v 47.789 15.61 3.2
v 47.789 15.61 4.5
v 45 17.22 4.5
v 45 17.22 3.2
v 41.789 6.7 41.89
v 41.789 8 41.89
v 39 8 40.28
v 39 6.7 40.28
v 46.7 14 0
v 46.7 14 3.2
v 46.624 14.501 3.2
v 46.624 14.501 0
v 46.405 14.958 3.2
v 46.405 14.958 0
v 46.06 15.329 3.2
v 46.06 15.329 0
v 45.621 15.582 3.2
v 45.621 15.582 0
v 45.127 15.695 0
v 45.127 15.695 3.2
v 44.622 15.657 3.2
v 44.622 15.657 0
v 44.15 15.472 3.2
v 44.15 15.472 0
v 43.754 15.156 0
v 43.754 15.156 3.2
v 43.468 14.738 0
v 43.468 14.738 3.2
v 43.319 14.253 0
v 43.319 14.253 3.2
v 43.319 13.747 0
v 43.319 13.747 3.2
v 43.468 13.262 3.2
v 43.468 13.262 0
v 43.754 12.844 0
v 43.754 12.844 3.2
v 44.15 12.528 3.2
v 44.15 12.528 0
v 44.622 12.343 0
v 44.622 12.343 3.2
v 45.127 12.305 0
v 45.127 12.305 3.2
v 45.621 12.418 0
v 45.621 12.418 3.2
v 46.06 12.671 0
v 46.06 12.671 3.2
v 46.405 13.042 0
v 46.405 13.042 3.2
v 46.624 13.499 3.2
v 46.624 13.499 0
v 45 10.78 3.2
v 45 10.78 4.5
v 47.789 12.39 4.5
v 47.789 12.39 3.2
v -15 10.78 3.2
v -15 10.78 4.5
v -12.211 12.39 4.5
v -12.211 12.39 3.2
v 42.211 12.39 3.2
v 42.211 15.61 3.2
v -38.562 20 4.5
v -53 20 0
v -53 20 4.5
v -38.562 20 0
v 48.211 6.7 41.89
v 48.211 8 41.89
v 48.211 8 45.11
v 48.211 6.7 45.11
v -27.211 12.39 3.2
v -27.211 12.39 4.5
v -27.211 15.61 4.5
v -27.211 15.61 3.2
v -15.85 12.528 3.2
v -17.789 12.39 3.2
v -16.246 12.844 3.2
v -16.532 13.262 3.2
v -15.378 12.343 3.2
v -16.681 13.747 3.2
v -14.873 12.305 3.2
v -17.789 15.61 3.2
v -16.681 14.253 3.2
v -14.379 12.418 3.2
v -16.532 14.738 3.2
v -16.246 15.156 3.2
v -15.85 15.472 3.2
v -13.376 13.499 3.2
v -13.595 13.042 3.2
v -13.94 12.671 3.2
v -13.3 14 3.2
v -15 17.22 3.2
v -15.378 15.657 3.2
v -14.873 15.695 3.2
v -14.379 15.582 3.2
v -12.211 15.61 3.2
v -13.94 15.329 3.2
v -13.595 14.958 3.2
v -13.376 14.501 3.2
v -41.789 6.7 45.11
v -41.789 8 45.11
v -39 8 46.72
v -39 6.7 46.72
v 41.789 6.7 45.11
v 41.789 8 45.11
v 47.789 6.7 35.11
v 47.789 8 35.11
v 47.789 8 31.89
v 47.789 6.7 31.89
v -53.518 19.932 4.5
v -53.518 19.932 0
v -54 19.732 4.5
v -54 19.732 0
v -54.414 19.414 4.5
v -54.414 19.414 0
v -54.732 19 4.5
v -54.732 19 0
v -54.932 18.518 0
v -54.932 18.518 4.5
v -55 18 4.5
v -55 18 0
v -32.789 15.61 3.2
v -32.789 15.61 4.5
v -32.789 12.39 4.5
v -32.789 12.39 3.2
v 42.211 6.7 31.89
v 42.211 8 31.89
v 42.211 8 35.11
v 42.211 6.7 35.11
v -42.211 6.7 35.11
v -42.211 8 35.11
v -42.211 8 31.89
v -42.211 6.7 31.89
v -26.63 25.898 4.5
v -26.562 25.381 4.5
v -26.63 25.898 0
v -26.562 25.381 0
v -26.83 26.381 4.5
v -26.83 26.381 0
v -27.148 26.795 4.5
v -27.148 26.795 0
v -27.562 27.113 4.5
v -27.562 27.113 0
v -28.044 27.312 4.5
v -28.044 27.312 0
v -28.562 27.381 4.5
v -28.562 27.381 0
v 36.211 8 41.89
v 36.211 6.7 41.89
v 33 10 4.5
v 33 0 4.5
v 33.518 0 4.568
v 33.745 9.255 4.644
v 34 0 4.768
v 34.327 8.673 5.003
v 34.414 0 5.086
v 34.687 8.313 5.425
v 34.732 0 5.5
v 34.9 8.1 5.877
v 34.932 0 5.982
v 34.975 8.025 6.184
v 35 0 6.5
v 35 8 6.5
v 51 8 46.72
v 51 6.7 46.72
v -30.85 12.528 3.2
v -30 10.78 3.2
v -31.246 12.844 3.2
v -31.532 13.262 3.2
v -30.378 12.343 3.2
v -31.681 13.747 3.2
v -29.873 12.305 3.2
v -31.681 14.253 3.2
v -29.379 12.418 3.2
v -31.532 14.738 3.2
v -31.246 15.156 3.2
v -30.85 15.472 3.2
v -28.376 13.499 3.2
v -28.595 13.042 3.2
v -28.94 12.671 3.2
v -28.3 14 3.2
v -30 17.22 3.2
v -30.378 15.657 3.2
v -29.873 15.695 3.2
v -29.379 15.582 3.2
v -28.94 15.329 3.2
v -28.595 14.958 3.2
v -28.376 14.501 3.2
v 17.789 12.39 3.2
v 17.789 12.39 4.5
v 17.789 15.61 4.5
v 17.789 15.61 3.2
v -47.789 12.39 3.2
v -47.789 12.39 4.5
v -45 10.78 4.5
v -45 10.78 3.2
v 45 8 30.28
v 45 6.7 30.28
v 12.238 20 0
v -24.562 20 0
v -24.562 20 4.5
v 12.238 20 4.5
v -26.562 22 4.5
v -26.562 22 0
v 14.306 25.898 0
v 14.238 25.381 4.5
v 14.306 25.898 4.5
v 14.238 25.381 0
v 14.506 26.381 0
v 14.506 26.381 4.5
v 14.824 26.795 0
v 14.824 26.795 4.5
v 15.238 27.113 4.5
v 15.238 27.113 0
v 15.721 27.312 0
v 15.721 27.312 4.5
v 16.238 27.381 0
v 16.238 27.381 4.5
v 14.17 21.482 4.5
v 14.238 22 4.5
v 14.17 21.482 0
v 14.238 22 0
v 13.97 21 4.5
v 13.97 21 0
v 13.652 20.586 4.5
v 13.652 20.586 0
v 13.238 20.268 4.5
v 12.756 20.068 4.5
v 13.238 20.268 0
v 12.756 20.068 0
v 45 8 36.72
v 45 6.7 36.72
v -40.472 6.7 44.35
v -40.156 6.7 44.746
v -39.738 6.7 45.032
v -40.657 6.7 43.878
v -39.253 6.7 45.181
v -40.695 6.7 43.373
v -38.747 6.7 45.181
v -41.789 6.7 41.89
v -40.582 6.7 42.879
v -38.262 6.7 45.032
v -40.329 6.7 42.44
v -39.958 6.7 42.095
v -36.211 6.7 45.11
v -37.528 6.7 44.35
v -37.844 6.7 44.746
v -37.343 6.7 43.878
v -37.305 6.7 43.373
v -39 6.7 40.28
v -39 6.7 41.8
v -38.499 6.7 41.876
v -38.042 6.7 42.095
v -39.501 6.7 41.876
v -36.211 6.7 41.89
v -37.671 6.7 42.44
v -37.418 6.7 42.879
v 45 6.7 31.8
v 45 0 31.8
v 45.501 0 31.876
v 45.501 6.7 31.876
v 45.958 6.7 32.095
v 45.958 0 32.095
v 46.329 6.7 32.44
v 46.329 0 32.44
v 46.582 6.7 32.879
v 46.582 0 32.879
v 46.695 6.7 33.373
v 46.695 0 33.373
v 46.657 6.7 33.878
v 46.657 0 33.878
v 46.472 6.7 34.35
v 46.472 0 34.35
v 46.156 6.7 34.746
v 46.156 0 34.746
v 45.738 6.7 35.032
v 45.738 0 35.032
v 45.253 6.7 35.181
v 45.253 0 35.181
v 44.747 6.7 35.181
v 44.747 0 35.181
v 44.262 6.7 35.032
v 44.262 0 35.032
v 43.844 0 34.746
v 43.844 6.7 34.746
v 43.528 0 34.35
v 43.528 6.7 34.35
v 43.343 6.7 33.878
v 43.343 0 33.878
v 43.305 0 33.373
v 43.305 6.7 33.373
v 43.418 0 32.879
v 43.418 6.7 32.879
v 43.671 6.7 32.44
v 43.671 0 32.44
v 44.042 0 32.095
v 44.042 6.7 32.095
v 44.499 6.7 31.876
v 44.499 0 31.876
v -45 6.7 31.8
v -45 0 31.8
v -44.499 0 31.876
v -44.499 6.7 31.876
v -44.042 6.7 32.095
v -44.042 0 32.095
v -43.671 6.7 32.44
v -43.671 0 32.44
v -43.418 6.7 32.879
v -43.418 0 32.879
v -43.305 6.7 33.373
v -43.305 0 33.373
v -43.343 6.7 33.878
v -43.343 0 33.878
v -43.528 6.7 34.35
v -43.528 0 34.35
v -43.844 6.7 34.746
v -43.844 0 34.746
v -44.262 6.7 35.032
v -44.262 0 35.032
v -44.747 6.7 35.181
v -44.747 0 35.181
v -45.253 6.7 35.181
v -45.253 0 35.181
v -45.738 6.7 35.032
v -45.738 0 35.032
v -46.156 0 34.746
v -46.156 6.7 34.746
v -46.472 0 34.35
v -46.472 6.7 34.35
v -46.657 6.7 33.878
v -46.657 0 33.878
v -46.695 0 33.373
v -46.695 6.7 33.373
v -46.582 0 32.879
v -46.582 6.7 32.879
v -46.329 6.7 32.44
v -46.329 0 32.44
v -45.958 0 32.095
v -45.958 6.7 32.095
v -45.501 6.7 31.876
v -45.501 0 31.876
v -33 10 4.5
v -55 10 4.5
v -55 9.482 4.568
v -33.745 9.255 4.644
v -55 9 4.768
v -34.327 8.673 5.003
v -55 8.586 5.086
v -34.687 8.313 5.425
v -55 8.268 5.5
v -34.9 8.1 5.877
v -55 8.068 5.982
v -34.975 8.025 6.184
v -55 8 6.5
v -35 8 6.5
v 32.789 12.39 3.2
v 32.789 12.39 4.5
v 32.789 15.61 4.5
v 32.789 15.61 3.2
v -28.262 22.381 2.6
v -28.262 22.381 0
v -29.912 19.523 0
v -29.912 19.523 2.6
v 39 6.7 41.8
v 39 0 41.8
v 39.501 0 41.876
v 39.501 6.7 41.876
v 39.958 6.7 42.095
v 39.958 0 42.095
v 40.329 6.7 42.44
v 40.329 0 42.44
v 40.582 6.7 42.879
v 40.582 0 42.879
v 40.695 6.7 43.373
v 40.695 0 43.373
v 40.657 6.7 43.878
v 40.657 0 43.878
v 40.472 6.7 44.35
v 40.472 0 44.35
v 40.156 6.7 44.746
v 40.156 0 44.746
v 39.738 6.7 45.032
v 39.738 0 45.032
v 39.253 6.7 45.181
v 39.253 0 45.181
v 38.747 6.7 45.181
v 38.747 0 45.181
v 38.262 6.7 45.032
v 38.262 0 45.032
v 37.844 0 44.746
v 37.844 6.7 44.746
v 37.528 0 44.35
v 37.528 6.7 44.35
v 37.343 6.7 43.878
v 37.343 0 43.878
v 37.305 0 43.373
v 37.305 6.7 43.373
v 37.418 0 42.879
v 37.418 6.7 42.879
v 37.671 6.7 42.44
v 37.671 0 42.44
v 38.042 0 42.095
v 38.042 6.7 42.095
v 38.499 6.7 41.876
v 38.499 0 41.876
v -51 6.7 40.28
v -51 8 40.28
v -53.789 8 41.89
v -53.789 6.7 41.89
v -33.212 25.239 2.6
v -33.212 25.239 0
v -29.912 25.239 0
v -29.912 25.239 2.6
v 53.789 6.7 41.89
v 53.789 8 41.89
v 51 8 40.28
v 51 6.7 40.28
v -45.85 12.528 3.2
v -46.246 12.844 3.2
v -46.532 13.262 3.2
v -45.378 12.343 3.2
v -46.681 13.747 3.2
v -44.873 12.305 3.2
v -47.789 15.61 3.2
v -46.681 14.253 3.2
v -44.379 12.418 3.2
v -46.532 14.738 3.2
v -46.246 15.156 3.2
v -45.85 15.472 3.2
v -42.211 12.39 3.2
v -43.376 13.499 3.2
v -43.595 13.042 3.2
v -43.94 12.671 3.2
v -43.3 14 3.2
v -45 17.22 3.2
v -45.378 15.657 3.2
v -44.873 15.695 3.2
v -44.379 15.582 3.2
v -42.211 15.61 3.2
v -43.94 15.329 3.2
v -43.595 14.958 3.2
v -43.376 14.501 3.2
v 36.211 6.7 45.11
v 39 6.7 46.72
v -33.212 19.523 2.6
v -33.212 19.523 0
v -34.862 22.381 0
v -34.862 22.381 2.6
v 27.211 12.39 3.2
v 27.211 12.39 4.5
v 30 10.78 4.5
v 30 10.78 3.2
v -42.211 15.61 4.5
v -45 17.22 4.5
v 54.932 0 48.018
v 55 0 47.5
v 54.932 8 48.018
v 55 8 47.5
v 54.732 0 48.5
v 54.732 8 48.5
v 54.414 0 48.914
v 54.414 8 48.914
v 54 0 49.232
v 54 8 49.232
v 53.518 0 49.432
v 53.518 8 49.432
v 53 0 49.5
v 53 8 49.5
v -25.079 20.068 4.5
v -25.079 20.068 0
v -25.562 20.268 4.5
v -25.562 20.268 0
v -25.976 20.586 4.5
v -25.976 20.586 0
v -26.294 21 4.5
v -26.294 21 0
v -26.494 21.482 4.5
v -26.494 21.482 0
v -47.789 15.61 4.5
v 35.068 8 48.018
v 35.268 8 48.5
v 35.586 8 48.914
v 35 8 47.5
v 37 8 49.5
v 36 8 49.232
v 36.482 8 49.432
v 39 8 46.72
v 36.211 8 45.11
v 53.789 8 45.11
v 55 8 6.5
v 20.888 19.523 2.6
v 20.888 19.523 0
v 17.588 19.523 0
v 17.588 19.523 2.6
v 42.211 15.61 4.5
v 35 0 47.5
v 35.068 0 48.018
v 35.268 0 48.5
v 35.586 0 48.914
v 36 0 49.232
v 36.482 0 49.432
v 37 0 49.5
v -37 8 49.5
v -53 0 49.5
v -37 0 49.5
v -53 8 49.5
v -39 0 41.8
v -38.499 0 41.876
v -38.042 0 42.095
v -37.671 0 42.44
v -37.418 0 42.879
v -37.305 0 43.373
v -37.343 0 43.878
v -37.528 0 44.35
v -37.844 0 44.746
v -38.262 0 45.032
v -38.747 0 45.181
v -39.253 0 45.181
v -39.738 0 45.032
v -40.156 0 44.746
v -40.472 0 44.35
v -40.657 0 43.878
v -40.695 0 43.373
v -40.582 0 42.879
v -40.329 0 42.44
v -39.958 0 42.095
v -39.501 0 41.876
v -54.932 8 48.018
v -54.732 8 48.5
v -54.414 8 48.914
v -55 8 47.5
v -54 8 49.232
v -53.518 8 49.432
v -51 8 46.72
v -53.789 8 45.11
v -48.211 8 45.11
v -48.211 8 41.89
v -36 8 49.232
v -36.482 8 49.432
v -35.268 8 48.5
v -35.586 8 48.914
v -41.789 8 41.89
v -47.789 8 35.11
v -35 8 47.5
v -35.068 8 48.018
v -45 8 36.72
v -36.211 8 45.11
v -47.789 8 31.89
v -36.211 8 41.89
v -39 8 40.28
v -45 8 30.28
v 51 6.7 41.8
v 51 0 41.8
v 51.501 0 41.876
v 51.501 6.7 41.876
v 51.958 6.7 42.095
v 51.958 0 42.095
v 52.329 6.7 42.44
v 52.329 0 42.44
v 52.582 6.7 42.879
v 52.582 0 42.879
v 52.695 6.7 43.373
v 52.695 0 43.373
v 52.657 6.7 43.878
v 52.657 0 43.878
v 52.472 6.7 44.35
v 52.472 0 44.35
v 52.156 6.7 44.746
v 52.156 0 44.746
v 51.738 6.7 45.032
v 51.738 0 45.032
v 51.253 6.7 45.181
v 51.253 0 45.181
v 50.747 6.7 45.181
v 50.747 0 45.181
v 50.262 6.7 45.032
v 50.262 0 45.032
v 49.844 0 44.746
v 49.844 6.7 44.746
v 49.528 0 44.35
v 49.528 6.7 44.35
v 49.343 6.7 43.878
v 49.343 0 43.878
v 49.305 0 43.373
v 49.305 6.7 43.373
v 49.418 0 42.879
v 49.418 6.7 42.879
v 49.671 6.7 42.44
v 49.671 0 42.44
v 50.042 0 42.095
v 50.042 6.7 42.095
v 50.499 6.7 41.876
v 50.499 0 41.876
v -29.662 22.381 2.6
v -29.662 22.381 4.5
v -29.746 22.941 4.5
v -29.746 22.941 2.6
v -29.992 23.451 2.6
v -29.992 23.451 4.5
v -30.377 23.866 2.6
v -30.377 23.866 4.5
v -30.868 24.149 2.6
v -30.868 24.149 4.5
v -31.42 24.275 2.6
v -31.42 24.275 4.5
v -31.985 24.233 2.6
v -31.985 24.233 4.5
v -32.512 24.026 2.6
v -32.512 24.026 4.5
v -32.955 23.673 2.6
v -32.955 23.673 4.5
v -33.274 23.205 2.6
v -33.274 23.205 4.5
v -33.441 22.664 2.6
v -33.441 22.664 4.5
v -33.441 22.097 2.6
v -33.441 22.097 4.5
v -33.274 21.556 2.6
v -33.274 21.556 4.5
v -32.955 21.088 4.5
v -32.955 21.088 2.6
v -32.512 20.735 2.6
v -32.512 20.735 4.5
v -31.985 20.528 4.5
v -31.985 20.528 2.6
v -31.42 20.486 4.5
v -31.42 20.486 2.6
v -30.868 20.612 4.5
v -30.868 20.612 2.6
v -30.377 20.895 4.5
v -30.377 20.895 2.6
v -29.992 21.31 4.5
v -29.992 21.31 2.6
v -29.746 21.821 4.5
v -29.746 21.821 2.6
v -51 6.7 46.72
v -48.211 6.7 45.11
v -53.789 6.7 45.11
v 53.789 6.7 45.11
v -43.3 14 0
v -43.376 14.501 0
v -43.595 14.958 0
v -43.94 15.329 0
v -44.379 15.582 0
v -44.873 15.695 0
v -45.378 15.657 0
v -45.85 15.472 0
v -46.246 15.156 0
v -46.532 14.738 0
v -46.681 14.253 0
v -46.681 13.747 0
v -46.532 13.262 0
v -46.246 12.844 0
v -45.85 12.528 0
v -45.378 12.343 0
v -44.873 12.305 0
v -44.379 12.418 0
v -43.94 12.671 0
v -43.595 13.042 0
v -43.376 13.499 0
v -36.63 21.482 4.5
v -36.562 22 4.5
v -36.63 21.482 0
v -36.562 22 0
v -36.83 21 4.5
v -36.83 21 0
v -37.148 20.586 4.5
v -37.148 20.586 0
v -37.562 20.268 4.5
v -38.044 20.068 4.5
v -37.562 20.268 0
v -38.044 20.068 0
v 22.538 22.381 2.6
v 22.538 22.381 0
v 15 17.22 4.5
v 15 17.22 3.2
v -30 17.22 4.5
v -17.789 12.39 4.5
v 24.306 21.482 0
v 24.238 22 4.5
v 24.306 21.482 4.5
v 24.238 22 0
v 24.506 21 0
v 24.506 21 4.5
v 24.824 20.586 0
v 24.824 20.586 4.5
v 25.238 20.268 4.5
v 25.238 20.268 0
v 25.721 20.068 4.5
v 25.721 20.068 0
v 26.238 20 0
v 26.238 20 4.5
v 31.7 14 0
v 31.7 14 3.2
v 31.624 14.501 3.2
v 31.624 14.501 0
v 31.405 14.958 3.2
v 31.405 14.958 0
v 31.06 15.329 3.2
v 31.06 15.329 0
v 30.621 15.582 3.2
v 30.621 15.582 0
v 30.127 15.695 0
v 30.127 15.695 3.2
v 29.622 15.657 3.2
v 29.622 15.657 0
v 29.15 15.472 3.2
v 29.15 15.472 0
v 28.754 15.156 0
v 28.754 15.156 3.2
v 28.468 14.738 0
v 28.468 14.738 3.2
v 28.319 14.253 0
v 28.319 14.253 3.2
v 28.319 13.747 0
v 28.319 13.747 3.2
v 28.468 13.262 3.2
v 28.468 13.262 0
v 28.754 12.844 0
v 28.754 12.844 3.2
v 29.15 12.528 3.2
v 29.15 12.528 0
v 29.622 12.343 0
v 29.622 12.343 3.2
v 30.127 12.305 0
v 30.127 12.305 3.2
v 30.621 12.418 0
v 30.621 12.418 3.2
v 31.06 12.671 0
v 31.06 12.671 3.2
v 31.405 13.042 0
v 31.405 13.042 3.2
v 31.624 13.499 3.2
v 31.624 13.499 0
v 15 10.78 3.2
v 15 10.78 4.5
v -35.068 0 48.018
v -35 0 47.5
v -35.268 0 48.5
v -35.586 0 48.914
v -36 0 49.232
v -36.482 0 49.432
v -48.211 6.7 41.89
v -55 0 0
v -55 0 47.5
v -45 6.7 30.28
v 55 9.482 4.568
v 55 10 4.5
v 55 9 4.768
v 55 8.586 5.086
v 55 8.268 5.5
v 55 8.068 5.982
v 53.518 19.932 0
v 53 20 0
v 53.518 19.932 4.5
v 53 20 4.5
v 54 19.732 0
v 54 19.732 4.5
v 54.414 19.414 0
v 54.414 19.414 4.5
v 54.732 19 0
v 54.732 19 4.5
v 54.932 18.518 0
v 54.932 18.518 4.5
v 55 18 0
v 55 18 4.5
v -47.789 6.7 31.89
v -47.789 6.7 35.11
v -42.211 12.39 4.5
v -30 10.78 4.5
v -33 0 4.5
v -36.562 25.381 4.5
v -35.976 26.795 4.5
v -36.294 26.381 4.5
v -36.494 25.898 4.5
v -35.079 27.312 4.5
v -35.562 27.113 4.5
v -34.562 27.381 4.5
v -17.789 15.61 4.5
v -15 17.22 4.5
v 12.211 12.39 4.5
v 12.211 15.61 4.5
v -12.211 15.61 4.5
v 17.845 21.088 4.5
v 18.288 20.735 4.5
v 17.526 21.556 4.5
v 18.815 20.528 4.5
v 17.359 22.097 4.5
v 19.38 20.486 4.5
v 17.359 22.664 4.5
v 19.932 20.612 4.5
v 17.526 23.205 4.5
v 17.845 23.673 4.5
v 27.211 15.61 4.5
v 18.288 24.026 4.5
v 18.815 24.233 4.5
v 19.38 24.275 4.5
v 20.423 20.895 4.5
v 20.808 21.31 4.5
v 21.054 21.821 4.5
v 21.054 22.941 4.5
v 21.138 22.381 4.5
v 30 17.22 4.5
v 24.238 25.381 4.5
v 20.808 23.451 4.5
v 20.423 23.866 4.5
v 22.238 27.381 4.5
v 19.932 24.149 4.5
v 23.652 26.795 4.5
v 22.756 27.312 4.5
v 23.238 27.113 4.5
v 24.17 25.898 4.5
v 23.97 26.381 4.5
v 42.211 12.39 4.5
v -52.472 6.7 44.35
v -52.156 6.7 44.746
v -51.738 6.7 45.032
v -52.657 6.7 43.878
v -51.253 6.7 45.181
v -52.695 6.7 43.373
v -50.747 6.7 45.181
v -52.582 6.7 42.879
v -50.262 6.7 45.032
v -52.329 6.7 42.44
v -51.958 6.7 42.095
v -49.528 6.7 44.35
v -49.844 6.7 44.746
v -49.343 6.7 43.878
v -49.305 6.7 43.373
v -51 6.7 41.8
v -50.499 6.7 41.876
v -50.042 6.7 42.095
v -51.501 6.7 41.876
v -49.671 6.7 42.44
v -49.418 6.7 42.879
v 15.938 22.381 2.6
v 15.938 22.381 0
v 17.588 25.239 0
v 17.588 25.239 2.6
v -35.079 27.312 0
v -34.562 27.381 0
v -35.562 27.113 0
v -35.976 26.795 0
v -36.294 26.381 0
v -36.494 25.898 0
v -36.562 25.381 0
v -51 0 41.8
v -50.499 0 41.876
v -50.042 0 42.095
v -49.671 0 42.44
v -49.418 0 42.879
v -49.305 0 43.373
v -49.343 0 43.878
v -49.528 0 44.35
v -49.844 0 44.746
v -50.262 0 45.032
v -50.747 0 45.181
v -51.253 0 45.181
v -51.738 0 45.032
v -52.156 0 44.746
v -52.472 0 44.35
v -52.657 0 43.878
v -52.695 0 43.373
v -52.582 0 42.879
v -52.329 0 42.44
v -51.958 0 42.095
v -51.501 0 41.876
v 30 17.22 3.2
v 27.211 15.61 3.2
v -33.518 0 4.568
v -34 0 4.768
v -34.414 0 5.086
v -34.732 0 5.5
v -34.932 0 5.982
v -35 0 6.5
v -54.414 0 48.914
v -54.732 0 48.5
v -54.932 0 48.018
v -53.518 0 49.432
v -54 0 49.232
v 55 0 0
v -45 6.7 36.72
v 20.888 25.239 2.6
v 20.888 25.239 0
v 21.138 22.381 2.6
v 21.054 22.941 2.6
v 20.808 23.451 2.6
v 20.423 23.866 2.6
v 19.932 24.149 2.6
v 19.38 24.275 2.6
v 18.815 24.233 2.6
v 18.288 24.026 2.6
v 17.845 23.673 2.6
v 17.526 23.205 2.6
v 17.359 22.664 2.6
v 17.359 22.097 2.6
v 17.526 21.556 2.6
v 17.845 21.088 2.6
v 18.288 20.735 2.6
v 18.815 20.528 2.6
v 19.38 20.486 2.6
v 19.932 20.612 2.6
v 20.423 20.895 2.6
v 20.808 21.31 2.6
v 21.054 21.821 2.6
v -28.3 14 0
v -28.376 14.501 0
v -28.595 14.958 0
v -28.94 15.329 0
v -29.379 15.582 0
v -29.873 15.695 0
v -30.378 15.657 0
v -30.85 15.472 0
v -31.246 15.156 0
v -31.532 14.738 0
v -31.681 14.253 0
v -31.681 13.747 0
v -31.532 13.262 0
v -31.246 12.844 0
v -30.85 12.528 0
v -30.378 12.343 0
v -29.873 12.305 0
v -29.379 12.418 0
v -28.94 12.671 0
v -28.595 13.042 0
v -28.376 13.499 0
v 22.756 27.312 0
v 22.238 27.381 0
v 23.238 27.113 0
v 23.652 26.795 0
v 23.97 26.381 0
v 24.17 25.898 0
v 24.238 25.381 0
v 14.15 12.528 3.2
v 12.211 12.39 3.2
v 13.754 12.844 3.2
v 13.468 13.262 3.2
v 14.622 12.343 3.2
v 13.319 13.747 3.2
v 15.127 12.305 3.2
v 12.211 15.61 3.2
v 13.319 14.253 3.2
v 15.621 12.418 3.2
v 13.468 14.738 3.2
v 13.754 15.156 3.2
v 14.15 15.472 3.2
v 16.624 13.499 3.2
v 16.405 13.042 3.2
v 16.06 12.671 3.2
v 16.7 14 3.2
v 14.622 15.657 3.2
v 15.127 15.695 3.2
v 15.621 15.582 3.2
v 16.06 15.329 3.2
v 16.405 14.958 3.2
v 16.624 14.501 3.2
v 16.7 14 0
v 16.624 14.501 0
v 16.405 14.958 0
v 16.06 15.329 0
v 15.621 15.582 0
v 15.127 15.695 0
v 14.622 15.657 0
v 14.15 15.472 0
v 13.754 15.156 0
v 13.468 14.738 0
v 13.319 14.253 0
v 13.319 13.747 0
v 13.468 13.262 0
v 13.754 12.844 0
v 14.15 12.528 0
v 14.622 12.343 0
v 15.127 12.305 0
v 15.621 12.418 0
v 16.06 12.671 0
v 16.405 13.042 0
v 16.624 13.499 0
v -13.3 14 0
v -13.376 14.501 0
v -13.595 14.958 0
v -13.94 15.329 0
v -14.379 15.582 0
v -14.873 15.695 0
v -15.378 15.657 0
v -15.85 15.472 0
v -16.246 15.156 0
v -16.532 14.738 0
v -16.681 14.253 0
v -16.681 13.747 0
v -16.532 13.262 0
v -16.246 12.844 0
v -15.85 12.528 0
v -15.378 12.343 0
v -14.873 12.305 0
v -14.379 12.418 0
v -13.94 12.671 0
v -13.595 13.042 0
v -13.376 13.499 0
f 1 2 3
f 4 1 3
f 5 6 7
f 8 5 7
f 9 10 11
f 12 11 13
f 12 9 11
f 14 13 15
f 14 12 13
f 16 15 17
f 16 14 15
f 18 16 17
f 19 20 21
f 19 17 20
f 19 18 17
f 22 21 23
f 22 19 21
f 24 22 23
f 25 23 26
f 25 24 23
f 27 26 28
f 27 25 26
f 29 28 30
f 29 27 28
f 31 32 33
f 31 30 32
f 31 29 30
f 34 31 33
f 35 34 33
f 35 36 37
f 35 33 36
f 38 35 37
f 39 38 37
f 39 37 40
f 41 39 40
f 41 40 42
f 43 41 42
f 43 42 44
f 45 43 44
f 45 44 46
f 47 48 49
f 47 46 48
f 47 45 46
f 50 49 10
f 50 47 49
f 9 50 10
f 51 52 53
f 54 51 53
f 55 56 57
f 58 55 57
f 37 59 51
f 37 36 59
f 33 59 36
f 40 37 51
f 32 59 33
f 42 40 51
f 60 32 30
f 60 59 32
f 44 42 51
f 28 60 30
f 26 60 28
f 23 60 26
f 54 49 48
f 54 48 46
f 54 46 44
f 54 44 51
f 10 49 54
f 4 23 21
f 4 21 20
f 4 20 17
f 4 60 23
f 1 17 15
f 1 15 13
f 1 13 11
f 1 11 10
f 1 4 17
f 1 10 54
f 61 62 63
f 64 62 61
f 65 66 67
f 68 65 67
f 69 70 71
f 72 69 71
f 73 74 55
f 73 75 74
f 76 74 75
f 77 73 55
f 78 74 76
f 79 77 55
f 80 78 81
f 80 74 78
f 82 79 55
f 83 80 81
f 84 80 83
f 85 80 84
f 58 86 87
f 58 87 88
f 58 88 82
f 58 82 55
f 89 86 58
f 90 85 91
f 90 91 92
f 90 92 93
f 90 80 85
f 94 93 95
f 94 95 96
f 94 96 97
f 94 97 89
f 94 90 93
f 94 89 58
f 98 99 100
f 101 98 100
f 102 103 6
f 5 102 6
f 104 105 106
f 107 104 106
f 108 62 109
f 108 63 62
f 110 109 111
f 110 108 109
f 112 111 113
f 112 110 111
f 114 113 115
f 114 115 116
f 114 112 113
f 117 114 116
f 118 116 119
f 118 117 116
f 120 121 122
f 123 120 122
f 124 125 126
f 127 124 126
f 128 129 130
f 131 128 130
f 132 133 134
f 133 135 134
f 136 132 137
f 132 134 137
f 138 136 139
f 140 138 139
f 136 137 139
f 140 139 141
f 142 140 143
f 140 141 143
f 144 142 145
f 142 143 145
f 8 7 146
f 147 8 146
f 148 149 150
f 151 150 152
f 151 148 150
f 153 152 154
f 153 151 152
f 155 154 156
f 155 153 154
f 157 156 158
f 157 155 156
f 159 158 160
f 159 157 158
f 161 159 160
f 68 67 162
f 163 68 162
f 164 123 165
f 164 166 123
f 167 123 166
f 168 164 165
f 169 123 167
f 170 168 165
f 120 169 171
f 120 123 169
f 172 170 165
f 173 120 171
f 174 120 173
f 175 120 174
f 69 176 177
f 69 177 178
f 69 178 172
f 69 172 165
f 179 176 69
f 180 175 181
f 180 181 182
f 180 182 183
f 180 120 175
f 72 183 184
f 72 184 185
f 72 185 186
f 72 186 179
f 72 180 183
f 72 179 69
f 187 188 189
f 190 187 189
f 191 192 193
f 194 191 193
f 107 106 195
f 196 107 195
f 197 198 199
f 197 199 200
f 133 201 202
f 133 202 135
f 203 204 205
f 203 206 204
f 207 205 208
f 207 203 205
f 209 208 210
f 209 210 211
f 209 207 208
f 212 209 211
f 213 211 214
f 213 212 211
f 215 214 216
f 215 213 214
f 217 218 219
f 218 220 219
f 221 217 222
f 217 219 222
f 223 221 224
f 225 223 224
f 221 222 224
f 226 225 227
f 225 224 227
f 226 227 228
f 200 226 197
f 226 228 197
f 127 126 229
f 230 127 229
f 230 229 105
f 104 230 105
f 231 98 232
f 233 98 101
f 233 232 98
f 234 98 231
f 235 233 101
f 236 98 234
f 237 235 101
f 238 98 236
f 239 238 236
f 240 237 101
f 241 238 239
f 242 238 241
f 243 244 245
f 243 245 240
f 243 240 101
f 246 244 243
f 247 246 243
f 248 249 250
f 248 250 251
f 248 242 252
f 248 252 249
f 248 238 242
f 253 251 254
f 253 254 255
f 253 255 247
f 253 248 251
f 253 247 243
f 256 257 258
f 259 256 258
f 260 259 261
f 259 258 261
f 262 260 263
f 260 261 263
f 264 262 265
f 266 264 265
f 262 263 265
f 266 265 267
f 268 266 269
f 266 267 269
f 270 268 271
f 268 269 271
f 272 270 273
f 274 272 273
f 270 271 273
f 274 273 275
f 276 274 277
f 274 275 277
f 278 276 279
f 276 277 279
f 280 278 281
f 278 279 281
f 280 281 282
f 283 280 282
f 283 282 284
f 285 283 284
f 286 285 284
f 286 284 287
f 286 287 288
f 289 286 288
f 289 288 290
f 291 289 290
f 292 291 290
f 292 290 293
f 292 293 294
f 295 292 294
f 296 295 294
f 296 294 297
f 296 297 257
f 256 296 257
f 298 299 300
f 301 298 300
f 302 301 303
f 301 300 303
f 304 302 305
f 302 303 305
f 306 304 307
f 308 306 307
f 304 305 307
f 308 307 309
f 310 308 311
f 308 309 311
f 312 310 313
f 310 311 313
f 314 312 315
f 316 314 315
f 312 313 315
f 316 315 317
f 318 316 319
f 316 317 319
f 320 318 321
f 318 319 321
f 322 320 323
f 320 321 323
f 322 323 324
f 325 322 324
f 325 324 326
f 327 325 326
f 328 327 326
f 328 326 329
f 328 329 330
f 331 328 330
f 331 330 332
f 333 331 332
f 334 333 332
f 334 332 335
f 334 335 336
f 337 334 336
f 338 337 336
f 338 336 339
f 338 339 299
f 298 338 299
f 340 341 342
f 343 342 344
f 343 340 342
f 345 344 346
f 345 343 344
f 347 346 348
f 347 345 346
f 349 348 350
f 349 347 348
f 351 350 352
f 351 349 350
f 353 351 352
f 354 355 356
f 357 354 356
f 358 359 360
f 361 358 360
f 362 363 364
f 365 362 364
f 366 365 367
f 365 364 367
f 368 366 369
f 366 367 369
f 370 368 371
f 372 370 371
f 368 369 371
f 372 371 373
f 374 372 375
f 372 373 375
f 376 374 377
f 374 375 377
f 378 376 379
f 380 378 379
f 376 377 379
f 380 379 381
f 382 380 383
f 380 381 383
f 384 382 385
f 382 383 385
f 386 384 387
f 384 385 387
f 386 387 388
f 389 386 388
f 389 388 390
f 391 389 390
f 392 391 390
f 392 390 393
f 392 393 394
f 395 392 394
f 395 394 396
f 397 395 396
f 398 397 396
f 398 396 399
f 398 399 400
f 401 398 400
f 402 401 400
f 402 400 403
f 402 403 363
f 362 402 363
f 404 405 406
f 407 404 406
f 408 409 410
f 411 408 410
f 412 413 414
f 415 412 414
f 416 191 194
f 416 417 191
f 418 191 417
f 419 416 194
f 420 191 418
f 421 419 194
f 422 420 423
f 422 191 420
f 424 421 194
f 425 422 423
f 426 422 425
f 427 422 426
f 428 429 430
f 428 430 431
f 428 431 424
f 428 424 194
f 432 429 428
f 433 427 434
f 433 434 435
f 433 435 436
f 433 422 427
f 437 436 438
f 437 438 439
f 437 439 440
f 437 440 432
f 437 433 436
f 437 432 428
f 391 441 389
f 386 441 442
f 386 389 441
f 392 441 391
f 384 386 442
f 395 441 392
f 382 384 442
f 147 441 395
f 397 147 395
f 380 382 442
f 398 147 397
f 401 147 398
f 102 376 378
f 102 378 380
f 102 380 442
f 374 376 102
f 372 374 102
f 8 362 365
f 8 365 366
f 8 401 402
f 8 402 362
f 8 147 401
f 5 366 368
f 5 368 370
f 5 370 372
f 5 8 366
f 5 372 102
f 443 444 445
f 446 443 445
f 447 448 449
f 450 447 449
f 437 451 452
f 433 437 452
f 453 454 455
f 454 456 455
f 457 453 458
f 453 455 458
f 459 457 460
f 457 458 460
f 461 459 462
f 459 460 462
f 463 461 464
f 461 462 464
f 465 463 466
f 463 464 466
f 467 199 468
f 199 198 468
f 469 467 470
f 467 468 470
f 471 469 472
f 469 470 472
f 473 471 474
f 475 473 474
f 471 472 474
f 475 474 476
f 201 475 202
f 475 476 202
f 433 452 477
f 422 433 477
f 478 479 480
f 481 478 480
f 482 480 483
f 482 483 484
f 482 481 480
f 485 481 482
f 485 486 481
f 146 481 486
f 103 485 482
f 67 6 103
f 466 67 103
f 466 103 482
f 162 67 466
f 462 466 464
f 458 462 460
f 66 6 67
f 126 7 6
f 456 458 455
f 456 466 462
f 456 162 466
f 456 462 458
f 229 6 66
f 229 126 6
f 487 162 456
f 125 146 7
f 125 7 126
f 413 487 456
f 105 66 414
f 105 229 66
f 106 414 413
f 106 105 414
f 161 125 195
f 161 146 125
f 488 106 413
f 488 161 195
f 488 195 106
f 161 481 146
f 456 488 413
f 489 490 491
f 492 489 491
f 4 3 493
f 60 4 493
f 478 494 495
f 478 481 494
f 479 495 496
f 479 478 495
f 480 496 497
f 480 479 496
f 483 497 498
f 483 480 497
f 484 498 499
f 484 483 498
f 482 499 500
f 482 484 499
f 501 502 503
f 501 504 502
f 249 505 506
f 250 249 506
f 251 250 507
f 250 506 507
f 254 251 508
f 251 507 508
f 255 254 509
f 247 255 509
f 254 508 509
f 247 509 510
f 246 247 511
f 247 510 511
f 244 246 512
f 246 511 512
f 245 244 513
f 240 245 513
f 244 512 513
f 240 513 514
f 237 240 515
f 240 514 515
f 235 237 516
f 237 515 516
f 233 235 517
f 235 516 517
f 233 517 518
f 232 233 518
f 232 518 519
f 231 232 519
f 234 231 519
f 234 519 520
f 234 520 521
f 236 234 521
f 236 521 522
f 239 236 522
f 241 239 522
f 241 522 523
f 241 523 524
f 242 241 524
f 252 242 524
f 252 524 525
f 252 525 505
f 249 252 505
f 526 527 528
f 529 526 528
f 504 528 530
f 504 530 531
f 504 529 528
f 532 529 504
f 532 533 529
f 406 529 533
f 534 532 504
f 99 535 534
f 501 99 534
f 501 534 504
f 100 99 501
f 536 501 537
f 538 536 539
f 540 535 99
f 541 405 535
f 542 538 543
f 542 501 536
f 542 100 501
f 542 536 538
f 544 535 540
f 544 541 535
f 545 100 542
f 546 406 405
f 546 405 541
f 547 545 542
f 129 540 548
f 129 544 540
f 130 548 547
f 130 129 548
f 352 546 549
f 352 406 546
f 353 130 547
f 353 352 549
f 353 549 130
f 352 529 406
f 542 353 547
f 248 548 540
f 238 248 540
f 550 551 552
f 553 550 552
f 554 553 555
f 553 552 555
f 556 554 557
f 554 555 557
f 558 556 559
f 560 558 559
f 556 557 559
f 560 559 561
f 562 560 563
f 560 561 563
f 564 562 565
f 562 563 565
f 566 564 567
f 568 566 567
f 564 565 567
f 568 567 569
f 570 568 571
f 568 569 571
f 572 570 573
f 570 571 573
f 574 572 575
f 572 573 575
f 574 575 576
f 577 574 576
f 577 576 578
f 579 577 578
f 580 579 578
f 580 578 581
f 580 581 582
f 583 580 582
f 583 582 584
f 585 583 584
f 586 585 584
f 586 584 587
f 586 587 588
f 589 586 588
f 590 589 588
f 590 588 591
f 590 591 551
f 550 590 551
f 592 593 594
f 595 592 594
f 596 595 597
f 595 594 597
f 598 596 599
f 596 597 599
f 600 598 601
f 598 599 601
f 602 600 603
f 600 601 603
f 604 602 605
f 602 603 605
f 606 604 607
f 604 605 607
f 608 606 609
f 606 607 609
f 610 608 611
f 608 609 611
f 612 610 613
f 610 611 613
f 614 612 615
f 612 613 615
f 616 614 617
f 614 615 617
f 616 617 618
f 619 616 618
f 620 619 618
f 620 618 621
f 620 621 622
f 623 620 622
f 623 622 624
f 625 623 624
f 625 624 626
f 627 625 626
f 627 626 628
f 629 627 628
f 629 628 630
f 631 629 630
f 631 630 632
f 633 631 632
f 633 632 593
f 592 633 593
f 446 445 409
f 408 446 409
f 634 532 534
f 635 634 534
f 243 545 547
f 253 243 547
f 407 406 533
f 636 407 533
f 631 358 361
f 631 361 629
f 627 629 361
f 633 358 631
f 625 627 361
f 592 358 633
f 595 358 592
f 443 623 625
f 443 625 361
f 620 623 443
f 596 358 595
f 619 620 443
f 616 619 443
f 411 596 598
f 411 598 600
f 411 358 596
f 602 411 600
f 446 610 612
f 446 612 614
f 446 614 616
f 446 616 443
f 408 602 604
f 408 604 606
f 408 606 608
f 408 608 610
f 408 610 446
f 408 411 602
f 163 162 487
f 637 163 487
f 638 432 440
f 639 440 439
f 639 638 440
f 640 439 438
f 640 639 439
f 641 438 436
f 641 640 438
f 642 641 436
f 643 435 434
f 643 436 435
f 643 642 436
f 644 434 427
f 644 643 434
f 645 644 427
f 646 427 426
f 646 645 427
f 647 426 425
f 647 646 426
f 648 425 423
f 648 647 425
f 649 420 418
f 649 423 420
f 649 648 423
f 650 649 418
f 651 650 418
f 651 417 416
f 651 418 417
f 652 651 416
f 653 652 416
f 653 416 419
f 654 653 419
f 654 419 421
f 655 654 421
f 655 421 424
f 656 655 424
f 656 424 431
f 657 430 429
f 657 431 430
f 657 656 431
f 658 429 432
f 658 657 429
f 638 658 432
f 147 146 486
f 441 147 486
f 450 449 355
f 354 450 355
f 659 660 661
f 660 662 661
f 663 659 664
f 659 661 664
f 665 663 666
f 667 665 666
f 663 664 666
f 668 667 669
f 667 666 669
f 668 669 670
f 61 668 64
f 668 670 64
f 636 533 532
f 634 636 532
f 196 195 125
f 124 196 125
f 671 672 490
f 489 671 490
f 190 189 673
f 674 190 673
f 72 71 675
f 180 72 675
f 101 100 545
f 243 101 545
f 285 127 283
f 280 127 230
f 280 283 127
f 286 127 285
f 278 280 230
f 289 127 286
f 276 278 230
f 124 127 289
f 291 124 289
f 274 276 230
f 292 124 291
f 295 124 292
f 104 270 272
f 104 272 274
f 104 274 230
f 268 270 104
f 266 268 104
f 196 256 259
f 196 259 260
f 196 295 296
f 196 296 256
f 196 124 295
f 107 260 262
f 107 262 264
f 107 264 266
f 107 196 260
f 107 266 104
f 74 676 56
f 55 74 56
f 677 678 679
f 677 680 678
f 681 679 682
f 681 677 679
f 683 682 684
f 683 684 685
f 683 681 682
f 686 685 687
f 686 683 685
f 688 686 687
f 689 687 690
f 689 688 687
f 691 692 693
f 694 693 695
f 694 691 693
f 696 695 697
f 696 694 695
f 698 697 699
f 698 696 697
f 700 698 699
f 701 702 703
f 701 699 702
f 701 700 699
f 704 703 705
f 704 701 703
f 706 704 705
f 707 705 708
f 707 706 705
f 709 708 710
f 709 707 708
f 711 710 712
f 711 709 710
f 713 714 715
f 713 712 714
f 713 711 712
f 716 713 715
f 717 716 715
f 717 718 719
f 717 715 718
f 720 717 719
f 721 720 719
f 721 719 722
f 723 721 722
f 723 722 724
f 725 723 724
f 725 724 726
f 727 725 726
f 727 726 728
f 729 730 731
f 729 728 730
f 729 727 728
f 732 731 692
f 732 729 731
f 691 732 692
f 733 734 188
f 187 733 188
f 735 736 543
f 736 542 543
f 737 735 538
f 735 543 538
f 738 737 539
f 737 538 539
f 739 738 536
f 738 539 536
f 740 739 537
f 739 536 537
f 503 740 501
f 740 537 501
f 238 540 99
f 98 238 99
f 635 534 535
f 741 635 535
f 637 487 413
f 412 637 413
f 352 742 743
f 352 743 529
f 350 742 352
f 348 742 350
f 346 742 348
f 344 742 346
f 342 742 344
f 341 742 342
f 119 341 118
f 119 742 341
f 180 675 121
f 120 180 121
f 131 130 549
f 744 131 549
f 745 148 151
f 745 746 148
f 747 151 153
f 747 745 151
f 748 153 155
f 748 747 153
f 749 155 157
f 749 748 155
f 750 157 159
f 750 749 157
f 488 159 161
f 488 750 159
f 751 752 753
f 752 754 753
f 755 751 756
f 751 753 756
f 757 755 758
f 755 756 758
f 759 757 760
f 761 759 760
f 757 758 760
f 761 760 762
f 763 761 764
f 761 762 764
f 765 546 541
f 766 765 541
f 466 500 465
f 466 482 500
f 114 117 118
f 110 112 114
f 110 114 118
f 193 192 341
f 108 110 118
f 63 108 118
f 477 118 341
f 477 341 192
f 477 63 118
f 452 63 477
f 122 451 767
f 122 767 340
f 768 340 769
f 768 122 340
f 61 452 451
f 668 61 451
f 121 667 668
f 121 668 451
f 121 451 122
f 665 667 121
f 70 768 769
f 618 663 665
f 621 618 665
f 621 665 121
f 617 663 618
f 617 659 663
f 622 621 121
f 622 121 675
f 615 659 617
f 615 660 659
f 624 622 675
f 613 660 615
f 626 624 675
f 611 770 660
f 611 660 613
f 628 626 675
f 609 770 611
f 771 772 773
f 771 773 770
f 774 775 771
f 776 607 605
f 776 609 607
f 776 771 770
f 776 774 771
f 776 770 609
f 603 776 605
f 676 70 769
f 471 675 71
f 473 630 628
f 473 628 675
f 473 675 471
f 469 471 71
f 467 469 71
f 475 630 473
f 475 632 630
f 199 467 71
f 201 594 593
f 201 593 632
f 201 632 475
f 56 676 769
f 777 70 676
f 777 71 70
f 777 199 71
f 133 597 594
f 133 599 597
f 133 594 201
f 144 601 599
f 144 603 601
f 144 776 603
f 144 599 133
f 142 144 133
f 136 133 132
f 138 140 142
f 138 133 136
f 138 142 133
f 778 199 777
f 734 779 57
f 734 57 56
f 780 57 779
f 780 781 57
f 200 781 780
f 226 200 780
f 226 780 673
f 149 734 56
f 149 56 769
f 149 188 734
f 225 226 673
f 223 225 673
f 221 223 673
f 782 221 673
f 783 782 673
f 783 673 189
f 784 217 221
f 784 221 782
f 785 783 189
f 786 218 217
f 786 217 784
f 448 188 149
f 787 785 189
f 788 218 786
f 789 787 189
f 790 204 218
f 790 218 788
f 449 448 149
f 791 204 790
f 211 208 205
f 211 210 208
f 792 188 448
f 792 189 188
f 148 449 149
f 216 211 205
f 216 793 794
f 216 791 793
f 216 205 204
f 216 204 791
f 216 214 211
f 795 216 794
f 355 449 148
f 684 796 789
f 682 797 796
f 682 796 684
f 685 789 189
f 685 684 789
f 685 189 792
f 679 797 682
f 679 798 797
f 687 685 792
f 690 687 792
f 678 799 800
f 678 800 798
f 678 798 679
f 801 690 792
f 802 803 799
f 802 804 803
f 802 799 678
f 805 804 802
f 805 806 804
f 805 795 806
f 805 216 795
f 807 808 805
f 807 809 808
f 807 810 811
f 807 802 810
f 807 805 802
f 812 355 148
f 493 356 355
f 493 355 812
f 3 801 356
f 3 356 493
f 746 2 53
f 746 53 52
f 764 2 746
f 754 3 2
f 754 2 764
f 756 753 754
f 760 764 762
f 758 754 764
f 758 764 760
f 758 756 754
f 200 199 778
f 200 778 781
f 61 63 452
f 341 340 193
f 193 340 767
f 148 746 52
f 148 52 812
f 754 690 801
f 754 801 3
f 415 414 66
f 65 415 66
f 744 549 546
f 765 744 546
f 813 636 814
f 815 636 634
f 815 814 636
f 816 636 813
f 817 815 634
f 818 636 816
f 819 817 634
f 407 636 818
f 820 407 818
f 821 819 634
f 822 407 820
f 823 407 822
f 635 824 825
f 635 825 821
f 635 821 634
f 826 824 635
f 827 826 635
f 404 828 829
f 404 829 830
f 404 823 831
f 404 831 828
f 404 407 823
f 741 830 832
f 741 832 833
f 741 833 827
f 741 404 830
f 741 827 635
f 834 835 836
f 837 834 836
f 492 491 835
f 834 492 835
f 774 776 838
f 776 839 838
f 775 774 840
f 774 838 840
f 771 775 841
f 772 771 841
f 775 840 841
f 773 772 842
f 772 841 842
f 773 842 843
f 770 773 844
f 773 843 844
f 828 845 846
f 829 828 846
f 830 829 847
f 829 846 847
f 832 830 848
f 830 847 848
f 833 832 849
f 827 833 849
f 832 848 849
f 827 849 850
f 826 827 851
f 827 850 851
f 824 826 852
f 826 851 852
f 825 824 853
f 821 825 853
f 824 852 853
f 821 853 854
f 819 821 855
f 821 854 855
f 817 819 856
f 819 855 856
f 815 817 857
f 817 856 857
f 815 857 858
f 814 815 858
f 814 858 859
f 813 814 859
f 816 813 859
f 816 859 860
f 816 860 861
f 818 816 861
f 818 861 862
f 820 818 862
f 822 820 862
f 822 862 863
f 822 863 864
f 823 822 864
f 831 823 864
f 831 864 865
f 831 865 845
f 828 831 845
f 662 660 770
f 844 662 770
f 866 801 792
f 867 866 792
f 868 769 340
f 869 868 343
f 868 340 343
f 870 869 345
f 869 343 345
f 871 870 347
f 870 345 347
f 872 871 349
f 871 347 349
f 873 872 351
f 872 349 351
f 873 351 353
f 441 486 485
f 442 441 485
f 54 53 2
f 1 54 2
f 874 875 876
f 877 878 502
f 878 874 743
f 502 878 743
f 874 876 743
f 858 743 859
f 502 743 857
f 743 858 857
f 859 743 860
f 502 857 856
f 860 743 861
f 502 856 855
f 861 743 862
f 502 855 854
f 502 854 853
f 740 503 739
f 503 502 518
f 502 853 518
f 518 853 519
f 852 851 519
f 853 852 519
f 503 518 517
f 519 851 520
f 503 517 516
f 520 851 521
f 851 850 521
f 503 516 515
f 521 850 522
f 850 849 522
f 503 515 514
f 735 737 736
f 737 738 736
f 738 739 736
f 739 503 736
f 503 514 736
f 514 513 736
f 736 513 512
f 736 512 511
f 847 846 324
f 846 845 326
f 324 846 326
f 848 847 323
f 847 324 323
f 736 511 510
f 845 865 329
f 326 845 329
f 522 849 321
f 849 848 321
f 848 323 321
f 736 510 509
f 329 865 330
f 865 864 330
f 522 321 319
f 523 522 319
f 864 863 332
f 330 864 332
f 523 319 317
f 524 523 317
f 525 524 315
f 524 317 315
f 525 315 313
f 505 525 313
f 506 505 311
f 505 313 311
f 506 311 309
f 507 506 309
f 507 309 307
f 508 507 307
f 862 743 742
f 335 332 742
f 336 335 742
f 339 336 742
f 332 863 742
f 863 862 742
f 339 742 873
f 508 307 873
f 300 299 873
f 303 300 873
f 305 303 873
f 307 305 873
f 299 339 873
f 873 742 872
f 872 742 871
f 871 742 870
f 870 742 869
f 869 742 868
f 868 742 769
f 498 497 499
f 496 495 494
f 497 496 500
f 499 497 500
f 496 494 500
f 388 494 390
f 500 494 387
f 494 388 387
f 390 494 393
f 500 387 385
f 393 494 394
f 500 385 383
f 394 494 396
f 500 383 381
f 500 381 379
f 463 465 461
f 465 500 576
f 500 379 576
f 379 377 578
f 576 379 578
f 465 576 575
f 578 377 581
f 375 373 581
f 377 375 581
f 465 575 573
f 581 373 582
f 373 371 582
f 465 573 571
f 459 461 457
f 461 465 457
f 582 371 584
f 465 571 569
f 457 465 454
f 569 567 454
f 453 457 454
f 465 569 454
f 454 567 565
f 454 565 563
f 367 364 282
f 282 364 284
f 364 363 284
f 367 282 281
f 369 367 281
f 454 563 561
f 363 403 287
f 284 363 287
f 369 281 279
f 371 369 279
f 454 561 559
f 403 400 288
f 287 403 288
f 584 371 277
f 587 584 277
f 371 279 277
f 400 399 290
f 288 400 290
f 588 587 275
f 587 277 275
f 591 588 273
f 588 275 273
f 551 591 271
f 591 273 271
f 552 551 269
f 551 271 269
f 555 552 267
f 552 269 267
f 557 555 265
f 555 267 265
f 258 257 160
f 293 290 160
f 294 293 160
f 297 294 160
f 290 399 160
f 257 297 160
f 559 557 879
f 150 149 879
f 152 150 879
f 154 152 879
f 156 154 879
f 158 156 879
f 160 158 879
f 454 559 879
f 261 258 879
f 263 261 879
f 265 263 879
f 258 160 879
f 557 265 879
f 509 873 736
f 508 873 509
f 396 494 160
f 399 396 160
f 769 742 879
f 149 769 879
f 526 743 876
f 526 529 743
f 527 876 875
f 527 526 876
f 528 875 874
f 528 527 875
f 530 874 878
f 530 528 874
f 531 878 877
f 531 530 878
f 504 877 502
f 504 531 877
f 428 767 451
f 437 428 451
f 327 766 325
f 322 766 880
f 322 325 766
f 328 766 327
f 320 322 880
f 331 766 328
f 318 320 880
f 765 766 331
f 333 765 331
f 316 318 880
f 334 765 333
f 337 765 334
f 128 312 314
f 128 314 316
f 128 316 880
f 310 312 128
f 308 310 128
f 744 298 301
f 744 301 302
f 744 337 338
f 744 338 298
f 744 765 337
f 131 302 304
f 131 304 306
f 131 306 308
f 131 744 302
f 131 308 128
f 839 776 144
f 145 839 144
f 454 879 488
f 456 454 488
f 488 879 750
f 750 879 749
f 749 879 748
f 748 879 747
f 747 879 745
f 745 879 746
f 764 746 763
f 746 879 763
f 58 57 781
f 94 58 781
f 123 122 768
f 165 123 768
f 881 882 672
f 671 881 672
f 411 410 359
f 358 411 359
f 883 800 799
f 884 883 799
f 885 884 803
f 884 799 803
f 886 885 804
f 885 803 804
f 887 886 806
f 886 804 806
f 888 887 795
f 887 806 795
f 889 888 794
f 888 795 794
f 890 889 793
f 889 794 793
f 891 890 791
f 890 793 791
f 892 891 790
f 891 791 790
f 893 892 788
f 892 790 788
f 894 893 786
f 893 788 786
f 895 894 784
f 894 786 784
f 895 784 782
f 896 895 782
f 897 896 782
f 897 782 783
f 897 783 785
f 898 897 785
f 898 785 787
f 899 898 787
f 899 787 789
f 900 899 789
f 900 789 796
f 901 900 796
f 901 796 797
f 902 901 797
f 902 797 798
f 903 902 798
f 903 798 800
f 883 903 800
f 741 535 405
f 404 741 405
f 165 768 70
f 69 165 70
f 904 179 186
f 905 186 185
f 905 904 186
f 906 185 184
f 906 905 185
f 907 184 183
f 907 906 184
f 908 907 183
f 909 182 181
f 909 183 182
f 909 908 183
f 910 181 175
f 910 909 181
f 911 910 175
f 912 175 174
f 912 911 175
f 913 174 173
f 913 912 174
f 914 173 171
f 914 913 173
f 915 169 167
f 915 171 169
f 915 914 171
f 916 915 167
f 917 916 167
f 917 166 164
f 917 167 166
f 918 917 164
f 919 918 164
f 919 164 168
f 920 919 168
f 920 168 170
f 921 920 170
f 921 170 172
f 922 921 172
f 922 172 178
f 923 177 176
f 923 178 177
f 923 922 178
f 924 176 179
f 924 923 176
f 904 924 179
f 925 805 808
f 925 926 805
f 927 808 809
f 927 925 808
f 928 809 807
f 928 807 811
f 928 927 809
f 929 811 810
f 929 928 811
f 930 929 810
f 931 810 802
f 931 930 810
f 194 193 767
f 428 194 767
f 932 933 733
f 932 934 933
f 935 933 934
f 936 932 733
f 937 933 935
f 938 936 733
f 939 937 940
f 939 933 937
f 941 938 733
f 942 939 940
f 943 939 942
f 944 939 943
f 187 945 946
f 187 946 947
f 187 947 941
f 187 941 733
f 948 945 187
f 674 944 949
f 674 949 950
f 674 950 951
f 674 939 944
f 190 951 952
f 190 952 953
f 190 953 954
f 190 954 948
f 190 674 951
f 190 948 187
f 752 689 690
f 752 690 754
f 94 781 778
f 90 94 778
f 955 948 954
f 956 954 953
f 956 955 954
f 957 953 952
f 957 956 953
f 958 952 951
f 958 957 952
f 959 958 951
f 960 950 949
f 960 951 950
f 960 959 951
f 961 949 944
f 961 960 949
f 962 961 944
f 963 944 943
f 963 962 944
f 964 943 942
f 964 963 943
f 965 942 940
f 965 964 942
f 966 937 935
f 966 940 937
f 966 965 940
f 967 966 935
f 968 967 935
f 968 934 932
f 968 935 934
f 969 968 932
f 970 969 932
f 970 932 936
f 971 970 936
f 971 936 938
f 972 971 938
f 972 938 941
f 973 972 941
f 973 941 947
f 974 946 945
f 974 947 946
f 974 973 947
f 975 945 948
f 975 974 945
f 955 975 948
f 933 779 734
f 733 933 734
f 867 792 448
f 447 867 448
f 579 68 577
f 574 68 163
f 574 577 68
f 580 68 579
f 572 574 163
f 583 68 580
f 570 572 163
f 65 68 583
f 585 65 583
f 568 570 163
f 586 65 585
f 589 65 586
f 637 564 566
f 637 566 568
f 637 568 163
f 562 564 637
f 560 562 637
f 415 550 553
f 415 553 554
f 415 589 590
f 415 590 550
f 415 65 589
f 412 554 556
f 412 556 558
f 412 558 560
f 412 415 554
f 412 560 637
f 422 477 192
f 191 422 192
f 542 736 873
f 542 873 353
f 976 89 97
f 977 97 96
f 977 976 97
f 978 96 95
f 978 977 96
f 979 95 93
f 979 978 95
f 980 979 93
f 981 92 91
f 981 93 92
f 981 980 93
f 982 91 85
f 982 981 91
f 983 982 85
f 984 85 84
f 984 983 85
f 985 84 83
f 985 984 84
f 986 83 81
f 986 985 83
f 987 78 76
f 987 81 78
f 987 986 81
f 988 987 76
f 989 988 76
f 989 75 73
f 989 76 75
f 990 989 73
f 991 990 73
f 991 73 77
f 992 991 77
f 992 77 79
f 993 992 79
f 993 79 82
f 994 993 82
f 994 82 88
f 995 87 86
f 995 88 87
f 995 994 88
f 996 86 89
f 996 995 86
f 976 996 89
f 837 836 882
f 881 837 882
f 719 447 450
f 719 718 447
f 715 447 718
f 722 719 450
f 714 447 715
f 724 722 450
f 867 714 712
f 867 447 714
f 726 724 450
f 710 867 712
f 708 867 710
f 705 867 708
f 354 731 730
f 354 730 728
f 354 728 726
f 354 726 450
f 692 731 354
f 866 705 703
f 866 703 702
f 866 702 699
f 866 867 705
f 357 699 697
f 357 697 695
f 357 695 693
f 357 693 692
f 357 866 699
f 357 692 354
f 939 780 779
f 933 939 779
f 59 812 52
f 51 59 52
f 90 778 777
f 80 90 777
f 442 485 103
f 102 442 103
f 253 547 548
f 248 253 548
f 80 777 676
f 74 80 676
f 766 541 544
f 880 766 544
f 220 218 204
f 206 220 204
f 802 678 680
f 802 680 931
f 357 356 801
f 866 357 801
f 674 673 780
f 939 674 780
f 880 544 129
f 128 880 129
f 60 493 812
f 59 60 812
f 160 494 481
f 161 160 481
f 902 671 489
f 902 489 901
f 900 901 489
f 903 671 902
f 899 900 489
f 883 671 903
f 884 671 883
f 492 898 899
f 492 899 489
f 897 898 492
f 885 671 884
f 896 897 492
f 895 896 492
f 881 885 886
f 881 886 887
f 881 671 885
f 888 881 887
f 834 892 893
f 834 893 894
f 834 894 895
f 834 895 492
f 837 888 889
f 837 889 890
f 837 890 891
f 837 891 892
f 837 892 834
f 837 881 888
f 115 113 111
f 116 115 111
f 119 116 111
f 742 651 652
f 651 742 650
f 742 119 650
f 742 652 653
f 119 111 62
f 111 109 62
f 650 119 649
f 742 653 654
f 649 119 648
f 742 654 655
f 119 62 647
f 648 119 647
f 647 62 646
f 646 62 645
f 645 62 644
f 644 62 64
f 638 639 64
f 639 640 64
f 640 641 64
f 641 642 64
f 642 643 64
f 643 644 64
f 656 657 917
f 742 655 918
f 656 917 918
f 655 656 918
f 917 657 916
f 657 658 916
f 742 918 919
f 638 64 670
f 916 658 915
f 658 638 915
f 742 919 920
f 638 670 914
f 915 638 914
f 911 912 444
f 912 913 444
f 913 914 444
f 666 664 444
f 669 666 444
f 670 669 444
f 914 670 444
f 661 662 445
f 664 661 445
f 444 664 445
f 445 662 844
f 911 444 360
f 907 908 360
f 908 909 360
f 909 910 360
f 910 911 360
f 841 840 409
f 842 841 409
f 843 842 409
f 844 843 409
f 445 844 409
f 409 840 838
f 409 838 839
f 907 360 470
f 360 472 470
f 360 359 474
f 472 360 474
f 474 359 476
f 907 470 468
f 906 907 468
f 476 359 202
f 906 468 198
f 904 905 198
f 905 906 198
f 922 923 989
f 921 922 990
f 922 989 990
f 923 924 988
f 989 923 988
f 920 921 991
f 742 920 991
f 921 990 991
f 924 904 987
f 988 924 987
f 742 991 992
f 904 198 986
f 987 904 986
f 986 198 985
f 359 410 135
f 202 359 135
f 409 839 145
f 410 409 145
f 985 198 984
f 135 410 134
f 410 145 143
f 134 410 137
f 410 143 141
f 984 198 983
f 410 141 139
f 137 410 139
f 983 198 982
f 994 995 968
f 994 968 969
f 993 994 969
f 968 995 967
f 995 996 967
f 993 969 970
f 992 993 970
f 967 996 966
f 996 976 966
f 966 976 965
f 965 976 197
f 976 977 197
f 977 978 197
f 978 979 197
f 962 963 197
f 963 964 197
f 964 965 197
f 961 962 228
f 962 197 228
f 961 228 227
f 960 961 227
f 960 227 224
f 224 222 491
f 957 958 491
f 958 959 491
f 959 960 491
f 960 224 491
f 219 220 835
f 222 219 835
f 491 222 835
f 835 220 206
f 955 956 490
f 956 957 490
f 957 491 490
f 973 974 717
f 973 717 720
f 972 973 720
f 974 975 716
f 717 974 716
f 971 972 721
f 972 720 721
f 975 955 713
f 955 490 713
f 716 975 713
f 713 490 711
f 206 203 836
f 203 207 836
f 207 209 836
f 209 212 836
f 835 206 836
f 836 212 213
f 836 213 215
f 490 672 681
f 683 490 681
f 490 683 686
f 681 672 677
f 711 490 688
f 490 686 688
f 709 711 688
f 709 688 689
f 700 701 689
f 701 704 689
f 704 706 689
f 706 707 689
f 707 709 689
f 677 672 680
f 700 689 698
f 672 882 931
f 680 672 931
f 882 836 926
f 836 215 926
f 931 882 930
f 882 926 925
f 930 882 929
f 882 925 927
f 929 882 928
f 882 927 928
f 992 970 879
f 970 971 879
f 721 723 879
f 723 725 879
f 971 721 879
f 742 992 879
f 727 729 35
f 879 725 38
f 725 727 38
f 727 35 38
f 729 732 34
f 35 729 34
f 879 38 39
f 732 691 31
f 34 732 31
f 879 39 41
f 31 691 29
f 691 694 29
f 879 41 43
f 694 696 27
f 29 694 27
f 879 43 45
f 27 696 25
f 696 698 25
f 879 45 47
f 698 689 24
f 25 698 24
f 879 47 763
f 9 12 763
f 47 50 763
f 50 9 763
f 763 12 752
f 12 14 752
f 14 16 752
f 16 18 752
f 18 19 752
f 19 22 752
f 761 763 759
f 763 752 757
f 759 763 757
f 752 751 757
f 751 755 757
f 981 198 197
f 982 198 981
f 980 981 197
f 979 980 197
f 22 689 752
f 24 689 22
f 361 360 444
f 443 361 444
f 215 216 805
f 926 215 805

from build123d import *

# Parameters (mm, degrees)
SKETCH_1_W          = 110
SKETCH_1_H          = 20
SKETCH_1_R          = 1.7
EXTRUDE_1_DEPTH     = 4.5
SKETCH_2_W          = 20
SKETCH_2_H          = 8
EXTRUDE_2_DEPTH     = 45
CUT_EXTRUDE_1_DEPTH = 1.3
SKETCH_4_W          = 10
SKETCH_4_H          = 10
EXTRUDE_3_DEPTH     = 4.5
SKETCH_5_R          = 1.9
CUT_EXTRUDE_2_DEPTH = 77.155752448
CUT_EXTRUDE_3_DEPTH = 2.6
SKETCH_7_R          = 1.7
CUT_EXTRUDE_4_DEPTH = 79.898343651
CUT_EXTRUDE_5_DEPTH = 1.3
FILLET_1_R          = 2


with BuildPart() as part:
    # 草图1 → 凸台-拉伸1 (new body)
    with BuildSketch(Plane.XY):
        with Locations((0, 10)):
            Rectangle(SKETCH_1_W, SKETCH_1_H)
        with Locations((-45, 14)):
            Circle(SKETCH_1_R, mode=Mode.SUBTRACT)
        with Locations((-30, 14)):
            Circle(SKETCH_1_R, mode=Mode.SUBTRACT)
        with Locations((-15, 14)):
            Circle(SKETCH_1_R, mode=Mode.SUBTRACT)
        with Locations((15, 14)):
            Circle(SKETCH_1_R, mode=Mode.SUBTRACT)
        with Locations((30, 14)):
            Circle(SKETCH_1_R, mode=Mode.SUBTRACT)
        with Locations((45, 14)):
            Circle(SKETCH_1_R, mode=Mode.SUBTRACT)
    extrude(amount=EXTRUDE_1_DEPTH)

    # 草图2 → 凸台-拉伸2 (add)
    with BuildSketch(Plane.XY.offset(4.5)):
        with Locations((-45, 4)):
            Rectangle(SKETCH_2_W, SKETCH_2_H)
        with Locations((45, 4)):
            Rectangle(SKETCH_2_W, SKETCH_2_H)
    extrude(amount=EXTRUDE_2_DEPTH)

    # 草图3 → 切除-拉伸1 (cut)
    with BuildSketch(Plane.XY.offset(4.5)):
        Polygon((-45, 17.22), (-47.7886018, 15.61), (-47.7886018, 12.39), (-45, 10.78), (-42.2113982, 12.39), (-42.2113982, 15.61), align=None)
        Polygon((-30, 17.22), (-32.7886018, 15.61), (-32.7886018, 12.39), (-30, 10.78), (-27.2113982, 12.39), (-27.2113982, 15.61), align=None)
        Polygon((-15, 17.22), (-17.7886018, 15.61), (-17.7886018, 12.39), (-15, 10.78), (-12.2113982, 12.39), (-12.2113982, 15.61), align=None)
        Polygon((15, 17.22), (12.2113982, 15.61), (12.2113982, 12.39), (15, 10.78), (17.7886018, 12.39), (17.7886018, 15.61), align=None)
        Polygon((30, 17.22), (27.2113982, 15.61), (27.2113982, 12.39), (30, 10.78), (32.7886018, 12.39), (32.7886018, 15.61), align=None)
        Polygon((45, 17.22), (42.2113982, 15.61), (42.2113982, 12.39), (45, 10.78), (47.7886018, 12.39), (47.7886018, 15.61), align=None)
    extrude(amount=-CUT_EXTRUDE_1_DEPTH, mode=Mode.SUBTRACT)

    # 草图4 → 凸台-拉伸3 (add)
    with BuildSketch(Plane.XY.offset(4.5)):
        with Locations((19.238259457, 22.3806251)):
            Rectangle(SKETCH_4_W, SKETCH_4_H)
        with Locations((-31.561740543, 22.3806251)):
            Rectangle(SKETCH_4_W, SKETCH_4_H)
    extrude(amount=-EXTRUDE_3_DEPTH)

    # 草图5 → 切除-拉伸2 (cut, through all)
    with BuildSketch(Plane.XY.offset(4.5)):
        with Locations((19.238259457, 22.3806251)):
            Circle(SKETCH_5_R)
        with Locations((-31.561740543, 22.3806251)):
            Circle(SKETCH_5_R)
    extrude(amount=-CUT_EXTRUDE_2_DEPTH, mode=Mode.SUBTRACT)

    # 草图6 → 切除-拉伸3 (cut)
    with BuildSketch(Plane(origin=(0, 0, 0), x_dir=(-1, 0, 0), z_dir=(0, 0, -1))):
        Polygon((34.861740543, 22.3806251), (33.211740543, 25.238508932), (29.911740543, 25.238508932), (28.261740543, 22.3806251), (29.911740543, 19.522741267), (33.211740543, 19.522741267), align=None)
        Polygon((-15.938259457, 22.3806251), (-17.588259457, 25.238508932), (-20.888259457, 25.238508932), (-22.538259457, 22.3806251), (-20.888259457, 19.522741267), (-17.588259457, 19.522741267), align=None)
    extrude(amount=-CUT_EXTRUDE_3_DEPTH, mode=Mode.SUBTRACT)

    # 草图7 → 切除-拉伸4 (cut, through all)
    with BuildSketch(Plane.XZ):
        with Locations(Location((-51, 43.5, 0), (0, 0, 270))):
            Circle(SKETCH_7_R)
        with Locations(Location((-39, 43.5, 0), (0, 0, 270))):
            Circle(SKETCH_7_R)
        with Locations(Location((-45, 33.5, 0), (0, 0, 270))):
            Circle(SKETCH_7_R)
        with Locations(Location((39, 43.5, 0), (0, 0, 270))):
            Circle(SKETCH_7_R)
        with Locations(Location((51, 43.5, 0), (0, 0, 270))):
            Circle(SKETCH_7_R)
        with Locations(Location((45, 33.5, 0), (0, 0, 270))):
            Circle(SKETCH_7_R)
    extrude(amount=-CUT_EXTRUDE_4_DEPTH, mode=Mode.SUBTRACT)

    # 草图8 → 切除-拉伸5 (cut)
    with BuildSketch(Plane(origin=(0, 8, 0), x_dir=(1, 0, 0), z_dir=(0, 1, 0))):
        Polygon((51, -46.72), (53.7886018, -45.11), (53.7886018, -41.89), (51, -40.28), (48.2113982, -41.89), (48.2113982, -45.11), align=None)
        Polygon((39, -46.72), (41.7886018, -45.11), (41.7886018, -41.89), (39, -40.28), (36.2113982, -41.89), (36.2113982, -45.11), align=None)
        Polygon((45, -36.72), (47.7886018, -35.11), (47.7886018, -31.89), (45, -30.28), (42.2113982, -31.89), (42.2113982, -35.11), align=None)
        Polygon((-39, -46.72), (-36.2113982, -45.11), (-36.2113982, -41.89), (-39, -40.28), (-41.7886018, -41.89), (-41.7886018, -45.11), align=None)
        Polygon((-51, -46.72), (-48.2113982, -45.11), (-48.2113982, -41.89), (-51, -40.28), (-53.7886018, -41.89), (-53.7886018, -45.11), align=None)
        Polygon((-45, -36.72), (-42.2113982, -35.11), (-42.2113982, -31.89), (-45, -30.28), (-47.7886018, -31.89), (-47.7886018, -35.11), align=None)
    extrude(amount=-CUT_EXTRUDE_5_DEPTH, mode=Mode.SUBTRACT)

    # 圆角1
    fillet_1_edges = [part.edges().sort_by_distance(p)[0] for p in [
        (24.238259457, 20, 2.25),
        (14.238259457, 20, 2.25),
        (24.238259457, 27.3806251, 2.25),
        (14.238259457, 27.3806251, 2.25),
        (-26.561740543, 27.3806251, 2.25),
        (-36.561740543, 20, 2.25),
        (-36.561740543, 27.3806251, 2.25),
        (-26.561740543, 20, 2.25),
        (-35, 4, 4.5),
        (-45, 8, 4.5),
        (-55, 4, 49.5),
        (-35, 4, 49.5),
        (45, 8, 4.5),
        (35, 4, 4.5),
        (55, 4, 49.5),
        (35, 4, 49.5),
        (-55, 20, 2.25),
        (55, 20, 2.25),
    ]]
    fillet(fillet_1_edges, radius=FILLET_1_R)


solid = part.part
